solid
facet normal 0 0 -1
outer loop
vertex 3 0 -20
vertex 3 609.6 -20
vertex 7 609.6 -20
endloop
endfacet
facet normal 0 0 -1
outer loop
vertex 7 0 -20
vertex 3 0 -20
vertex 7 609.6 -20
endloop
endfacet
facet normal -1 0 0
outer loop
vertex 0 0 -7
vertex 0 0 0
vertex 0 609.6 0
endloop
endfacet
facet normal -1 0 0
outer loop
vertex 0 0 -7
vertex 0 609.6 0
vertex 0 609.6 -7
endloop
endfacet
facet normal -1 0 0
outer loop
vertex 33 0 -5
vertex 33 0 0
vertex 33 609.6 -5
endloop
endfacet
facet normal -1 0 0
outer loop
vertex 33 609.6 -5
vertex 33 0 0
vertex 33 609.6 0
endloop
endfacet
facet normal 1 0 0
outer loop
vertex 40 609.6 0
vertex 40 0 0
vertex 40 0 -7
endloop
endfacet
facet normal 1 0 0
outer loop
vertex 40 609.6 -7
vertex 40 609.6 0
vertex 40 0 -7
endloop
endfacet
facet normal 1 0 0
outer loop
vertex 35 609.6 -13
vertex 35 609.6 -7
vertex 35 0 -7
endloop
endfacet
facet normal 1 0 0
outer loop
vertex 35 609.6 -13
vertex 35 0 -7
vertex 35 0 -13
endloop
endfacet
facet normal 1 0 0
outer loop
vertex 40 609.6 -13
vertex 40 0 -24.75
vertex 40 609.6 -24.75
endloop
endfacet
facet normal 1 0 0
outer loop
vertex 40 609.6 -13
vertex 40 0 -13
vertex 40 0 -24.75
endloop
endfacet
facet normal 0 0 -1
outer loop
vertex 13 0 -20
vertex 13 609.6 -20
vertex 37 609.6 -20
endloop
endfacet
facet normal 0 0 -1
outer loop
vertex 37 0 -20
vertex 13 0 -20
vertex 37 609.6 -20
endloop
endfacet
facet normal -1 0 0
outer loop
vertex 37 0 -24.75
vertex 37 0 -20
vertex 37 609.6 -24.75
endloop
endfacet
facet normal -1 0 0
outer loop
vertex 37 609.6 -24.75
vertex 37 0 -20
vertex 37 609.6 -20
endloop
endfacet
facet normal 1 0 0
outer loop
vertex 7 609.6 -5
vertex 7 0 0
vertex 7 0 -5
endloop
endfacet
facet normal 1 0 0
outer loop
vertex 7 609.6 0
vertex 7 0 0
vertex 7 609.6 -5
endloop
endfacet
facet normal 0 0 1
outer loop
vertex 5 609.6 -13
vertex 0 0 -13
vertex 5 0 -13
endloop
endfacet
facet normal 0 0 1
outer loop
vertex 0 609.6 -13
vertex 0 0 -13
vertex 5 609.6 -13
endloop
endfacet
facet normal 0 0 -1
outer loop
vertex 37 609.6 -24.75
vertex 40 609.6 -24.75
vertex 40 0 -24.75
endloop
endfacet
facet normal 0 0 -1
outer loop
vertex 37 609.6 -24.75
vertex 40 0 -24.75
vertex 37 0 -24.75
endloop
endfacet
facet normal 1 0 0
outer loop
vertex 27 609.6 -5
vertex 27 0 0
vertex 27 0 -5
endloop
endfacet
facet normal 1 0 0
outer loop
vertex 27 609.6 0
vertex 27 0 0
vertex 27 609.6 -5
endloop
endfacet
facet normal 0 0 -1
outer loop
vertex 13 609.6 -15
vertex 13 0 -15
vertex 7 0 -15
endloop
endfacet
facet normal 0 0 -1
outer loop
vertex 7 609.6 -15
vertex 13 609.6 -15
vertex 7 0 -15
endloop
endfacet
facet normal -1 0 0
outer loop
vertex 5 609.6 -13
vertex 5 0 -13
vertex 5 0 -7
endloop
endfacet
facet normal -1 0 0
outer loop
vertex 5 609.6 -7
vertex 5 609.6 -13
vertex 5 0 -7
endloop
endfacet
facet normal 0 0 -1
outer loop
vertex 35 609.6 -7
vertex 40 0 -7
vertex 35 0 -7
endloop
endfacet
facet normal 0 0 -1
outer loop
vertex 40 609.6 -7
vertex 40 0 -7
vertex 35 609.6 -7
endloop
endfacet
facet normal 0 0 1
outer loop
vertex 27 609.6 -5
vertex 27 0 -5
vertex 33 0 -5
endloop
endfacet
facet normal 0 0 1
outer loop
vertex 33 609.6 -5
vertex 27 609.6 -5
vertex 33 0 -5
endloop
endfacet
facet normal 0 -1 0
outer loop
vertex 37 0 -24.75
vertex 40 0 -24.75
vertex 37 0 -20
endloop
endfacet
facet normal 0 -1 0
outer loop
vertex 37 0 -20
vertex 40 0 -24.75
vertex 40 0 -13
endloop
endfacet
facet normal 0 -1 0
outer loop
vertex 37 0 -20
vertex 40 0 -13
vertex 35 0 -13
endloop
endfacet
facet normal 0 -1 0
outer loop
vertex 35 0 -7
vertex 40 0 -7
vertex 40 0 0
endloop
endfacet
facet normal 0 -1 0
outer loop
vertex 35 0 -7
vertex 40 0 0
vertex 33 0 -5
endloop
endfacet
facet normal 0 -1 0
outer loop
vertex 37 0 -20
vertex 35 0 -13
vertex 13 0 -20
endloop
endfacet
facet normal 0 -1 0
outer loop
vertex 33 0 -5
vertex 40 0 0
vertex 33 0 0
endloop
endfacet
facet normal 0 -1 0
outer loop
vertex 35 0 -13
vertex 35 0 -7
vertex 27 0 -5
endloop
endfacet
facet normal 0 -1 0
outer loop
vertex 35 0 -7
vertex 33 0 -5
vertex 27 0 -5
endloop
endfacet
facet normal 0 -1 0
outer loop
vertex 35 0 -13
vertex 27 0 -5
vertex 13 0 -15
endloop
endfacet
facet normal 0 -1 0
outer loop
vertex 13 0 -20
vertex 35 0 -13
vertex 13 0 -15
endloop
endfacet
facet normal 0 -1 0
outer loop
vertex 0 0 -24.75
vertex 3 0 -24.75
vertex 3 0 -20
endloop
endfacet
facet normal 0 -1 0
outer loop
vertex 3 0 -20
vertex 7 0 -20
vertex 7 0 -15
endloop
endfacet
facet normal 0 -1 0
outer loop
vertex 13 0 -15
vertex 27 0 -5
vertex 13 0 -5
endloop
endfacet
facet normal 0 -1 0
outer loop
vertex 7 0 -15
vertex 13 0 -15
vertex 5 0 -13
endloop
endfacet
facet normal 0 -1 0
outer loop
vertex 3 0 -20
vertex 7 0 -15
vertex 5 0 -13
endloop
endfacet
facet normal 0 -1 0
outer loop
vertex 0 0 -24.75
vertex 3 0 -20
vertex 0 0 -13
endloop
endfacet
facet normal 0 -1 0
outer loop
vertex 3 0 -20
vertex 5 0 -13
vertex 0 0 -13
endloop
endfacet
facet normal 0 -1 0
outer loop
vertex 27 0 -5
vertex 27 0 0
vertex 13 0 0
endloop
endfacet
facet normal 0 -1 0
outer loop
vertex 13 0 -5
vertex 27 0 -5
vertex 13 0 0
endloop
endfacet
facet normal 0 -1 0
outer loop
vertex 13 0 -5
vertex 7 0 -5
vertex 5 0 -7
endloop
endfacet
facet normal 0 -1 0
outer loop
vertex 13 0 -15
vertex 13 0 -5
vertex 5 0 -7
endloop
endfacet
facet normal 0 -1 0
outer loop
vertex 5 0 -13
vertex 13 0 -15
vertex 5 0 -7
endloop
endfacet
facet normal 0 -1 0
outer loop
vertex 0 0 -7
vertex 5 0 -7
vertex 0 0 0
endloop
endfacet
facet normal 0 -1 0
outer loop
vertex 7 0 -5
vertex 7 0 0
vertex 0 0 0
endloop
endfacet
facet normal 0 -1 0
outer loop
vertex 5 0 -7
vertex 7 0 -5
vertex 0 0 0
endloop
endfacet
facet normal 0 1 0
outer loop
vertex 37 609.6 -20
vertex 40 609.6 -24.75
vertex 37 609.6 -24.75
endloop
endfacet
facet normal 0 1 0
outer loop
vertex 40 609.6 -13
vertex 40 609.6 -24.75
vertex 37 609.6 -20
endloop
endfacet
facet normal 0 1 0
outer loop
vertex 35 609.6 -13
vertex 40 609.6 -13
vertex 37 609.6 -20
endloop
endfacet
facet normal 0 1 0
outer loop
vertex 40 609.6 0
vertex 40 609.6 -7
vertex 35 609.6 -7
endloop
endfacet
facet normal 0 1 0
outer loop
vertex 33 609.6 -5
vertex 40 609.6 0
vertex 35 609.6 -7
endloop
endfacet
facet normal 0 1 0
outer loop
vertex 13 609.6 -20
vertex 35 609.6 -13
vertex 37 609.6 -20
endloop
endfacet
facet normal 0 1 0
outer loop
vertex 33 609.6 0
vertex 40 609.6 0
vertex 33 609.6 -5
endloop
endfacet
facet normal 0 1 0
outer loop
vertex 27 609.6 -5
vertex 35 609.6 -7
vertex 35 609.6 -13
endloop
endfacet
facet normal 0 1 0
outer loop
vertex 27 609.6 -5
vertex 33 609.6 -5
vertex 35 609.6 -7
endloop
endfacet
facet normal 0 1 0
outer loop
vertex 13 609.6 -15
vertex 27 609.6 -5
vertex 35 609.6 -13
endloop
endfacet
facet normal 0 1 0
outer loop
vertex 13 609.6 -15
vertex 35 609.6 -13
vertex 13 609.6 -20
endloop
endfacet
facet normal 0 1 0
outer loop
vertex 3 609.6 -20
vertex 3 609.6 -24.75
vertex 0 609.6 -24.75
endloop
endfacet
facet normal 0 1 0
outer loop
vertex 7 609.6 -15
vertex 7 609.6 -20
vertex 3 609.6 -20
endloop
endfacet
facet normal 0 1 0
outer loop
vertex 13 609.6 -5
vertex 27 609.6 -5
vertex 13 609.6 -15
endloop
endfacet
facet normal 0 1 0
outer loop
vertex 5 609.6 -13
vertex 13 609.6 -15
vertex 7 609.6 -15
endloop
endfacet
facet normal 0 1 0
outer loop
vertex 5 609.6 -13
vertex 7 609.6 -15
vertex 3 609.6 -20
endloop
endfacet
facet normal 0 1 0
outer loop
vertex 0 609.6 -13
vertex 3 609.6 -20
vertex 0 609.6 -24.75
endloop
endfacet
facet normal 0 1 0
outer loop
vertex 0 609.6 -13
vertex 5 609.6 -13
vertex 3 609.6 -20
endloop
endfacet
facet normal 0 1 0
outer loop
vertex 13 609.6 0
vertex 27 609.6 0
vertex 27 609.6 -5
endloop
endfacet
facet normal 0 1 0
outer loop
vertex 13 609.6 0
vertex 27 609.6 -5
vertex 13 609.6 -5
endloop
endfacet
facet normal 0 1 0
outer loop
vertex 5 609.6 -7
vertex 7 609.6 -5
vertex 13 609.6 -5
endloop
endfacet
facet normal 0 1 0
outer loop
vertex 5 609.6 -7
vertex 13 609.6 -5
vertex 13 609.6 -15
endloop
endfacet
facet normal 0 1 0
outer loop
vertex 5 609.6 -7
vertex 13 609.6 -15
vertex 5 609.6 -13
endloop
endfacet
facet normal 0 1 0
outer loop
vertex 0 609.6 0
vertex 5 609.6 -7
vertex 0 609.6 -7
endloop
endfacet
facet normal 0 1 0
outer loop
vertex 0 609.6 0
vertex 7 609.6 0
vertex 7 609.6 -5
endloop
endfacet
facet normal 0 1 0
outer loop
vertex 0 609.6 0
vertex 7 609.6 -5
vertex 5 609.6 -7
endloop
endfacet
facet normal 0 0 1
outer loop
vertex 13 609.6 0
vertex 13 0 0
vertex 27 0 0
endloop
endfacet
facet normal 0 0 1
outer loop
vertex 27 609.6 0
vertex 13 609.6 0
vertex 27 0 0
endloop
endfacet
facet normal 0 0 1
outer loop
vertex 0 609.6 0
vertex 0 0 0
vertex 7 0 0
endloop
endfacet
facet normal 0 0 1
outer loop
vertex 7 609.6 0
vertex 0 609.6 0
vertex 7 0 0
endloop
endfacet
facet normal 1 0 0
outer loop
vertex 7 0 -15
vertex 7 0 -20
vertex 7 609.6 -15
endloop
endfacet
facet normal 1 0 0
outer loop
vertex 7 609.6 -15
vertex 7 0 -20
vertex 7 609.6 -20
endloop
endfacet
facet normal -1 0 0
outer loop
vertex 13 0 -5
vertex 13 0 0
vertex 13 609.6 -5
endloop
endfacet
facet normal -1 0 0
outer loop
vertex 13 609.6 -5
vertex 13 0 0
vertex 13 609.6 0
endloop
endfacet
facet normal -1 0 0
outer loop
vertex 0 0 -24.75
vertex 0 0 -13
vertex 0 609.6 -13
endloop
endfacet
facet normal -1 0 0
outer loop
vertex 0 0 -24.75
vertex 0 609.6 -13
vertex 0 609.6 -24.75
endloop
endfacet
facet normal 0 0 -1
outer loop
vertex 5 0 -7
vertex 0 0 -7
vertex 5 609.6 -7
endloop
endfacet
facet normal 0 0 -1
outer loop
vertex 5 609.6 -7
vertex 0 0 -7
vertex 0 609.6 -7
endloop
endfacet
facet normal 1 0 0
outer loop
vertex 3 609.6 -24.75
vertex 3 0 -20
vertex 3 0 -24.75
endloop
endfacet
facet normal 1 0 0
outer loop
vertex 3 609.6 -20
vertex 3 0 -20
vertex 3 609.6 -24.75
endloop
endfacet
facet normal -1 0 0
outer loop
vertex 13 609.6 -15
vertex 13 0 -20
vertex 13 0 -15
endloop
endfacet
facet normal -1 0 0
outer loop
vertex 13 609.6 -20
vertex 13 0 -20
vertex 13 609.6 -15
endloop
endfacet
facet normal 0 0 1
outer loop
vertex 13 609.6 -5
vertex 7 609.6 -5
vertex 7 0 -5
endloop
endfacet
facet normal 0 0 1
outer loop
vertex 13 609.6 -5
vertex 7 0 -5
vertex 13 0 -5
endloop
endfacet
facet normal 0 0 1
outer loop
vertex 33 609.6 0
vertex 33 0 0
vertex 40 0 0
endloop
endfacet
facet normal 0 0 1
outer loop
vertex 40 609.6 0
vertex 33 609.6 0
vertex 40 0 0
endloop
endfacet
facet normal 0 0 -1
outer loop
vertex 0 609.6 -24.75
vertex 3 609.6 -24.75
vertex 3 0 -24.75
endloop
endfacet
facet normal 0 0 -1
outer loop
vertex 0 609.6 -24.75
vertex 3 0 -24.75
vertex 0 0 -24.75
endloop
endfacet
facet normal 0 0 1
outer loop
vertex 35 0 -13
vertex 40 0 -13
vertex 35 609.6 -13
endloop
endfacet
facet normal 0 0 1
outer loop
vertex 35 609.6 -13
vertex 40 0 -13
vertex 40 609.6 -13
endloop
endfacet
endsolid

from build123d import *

# Parameters (mm, degrees)
SKETCH1_W           = 40
SKETCH1_H           = 20
BOSS_EXTRUDE1_DEPTH = 609.6
SKETCH2_W           = 6
SKETCH2_H           = 609.6
CUT_EXTRUDE1_DEPTH  = 5
SKETCH3_W           = 6
SKETCH3_H           = 609.6
CUT_EXTRUDE2_DEPTH  = 5
SKETCH4_W           = 6
SKETCH4_H           = 609.6
CUT_EXTRUDE3_DEPTH  = 5
SKETCH5_W           = 6
SKETCH5_H           = 609.6
CUT_EXTRUDE4_DEPTH  = 5
SKETCH6_W           = 3
SKETCH6_H           = 609.6
BOSS_EXTRUDE2_DEPTH = 4.75


with BuildPart() as part:
    # Sketch1 → Boss-Extrude1 (new body)
    with BuildSketch(Plane(origin=(0, 0, 0), x_dir=(1, 0, 0), z_dir=(0, 1, 0))):
        with Locations((20, 10)):
            Rectangle(SKETCH1_W, SKETCH1_H)
    extrude(amount=BOSS_EXTRUDE1_DEPTH)

    # Sketch2 → Cut-Extrude1 (cut)
    with BuildSketch(Plane.XY):
        with Locations((10, 304.8)):
            Rectangle(SKETCH2_W, SKETCH2_H)
        with Locations((30, 304.8)):
            Rectangle(SKETCH2_W, SKETCH2_H)
    extrude(amount=-CUT_EXTRUDE1_DEPTH, mode=Mode.SUBTRACT)

    # Sketch3 → Cut-Extrude2 (cut)
    with BuildSketch(Plane.ZY):
        with Locations((-10, 304.8)):
            Rectangle(SKETCH3_W, SKETCH3_H)
    extrude(amount=-CUT_EXTRUDE2_DEPTH, mode=Mode.SUBTRACT)

    # Sketch4 → Cut-Extrude3 (cut)
    with BuildSketch(Plane(origin=(40, 0, 0), x_dir=(0, 0, -1), z_dir=(1, 0, 0))):
        with Locations((10, 304.8)):
            Rectangle(SKETCH4_W, SKETCH4_H)
    extrude(amount=-CUT_EXTRUDE3_DEPTH, mode=Mode.SUBTRACT)

    # Sketch5 → Cut-Extrude4 (cut)
    with BuildSketch(Plane(origin=(0, 0, -20), x_dir=(-1, 0, 0), z_dir=(0, 0, -1))):
        with Locations((-10, 304.8)):
            Rectangle(SKETCH5_W, SKETCH5_H)
    extrude(amount=-CUT_EXTRUDE4_DEPTH, mode=Mode.SUBTRACT)

    # Sketch6 → Boss-Extrude2 (add)
    with BuildSketch(Plane(origin=(0, 0, -20), x_dir=(-1, 0, 0), z_dir=(0, 0, -1))):
        with Locations((-38.5, 304.8)):
            Rectangle(SKETCH6_W, SKETCH6_H)
        with Locations((-1.5, 304.8)):
            Rectangle(SKETCH6_W, SKETCH6_H)
    extrude(amount=BOSS_EXTRUDE2_DEPTH)


solid = part.part
